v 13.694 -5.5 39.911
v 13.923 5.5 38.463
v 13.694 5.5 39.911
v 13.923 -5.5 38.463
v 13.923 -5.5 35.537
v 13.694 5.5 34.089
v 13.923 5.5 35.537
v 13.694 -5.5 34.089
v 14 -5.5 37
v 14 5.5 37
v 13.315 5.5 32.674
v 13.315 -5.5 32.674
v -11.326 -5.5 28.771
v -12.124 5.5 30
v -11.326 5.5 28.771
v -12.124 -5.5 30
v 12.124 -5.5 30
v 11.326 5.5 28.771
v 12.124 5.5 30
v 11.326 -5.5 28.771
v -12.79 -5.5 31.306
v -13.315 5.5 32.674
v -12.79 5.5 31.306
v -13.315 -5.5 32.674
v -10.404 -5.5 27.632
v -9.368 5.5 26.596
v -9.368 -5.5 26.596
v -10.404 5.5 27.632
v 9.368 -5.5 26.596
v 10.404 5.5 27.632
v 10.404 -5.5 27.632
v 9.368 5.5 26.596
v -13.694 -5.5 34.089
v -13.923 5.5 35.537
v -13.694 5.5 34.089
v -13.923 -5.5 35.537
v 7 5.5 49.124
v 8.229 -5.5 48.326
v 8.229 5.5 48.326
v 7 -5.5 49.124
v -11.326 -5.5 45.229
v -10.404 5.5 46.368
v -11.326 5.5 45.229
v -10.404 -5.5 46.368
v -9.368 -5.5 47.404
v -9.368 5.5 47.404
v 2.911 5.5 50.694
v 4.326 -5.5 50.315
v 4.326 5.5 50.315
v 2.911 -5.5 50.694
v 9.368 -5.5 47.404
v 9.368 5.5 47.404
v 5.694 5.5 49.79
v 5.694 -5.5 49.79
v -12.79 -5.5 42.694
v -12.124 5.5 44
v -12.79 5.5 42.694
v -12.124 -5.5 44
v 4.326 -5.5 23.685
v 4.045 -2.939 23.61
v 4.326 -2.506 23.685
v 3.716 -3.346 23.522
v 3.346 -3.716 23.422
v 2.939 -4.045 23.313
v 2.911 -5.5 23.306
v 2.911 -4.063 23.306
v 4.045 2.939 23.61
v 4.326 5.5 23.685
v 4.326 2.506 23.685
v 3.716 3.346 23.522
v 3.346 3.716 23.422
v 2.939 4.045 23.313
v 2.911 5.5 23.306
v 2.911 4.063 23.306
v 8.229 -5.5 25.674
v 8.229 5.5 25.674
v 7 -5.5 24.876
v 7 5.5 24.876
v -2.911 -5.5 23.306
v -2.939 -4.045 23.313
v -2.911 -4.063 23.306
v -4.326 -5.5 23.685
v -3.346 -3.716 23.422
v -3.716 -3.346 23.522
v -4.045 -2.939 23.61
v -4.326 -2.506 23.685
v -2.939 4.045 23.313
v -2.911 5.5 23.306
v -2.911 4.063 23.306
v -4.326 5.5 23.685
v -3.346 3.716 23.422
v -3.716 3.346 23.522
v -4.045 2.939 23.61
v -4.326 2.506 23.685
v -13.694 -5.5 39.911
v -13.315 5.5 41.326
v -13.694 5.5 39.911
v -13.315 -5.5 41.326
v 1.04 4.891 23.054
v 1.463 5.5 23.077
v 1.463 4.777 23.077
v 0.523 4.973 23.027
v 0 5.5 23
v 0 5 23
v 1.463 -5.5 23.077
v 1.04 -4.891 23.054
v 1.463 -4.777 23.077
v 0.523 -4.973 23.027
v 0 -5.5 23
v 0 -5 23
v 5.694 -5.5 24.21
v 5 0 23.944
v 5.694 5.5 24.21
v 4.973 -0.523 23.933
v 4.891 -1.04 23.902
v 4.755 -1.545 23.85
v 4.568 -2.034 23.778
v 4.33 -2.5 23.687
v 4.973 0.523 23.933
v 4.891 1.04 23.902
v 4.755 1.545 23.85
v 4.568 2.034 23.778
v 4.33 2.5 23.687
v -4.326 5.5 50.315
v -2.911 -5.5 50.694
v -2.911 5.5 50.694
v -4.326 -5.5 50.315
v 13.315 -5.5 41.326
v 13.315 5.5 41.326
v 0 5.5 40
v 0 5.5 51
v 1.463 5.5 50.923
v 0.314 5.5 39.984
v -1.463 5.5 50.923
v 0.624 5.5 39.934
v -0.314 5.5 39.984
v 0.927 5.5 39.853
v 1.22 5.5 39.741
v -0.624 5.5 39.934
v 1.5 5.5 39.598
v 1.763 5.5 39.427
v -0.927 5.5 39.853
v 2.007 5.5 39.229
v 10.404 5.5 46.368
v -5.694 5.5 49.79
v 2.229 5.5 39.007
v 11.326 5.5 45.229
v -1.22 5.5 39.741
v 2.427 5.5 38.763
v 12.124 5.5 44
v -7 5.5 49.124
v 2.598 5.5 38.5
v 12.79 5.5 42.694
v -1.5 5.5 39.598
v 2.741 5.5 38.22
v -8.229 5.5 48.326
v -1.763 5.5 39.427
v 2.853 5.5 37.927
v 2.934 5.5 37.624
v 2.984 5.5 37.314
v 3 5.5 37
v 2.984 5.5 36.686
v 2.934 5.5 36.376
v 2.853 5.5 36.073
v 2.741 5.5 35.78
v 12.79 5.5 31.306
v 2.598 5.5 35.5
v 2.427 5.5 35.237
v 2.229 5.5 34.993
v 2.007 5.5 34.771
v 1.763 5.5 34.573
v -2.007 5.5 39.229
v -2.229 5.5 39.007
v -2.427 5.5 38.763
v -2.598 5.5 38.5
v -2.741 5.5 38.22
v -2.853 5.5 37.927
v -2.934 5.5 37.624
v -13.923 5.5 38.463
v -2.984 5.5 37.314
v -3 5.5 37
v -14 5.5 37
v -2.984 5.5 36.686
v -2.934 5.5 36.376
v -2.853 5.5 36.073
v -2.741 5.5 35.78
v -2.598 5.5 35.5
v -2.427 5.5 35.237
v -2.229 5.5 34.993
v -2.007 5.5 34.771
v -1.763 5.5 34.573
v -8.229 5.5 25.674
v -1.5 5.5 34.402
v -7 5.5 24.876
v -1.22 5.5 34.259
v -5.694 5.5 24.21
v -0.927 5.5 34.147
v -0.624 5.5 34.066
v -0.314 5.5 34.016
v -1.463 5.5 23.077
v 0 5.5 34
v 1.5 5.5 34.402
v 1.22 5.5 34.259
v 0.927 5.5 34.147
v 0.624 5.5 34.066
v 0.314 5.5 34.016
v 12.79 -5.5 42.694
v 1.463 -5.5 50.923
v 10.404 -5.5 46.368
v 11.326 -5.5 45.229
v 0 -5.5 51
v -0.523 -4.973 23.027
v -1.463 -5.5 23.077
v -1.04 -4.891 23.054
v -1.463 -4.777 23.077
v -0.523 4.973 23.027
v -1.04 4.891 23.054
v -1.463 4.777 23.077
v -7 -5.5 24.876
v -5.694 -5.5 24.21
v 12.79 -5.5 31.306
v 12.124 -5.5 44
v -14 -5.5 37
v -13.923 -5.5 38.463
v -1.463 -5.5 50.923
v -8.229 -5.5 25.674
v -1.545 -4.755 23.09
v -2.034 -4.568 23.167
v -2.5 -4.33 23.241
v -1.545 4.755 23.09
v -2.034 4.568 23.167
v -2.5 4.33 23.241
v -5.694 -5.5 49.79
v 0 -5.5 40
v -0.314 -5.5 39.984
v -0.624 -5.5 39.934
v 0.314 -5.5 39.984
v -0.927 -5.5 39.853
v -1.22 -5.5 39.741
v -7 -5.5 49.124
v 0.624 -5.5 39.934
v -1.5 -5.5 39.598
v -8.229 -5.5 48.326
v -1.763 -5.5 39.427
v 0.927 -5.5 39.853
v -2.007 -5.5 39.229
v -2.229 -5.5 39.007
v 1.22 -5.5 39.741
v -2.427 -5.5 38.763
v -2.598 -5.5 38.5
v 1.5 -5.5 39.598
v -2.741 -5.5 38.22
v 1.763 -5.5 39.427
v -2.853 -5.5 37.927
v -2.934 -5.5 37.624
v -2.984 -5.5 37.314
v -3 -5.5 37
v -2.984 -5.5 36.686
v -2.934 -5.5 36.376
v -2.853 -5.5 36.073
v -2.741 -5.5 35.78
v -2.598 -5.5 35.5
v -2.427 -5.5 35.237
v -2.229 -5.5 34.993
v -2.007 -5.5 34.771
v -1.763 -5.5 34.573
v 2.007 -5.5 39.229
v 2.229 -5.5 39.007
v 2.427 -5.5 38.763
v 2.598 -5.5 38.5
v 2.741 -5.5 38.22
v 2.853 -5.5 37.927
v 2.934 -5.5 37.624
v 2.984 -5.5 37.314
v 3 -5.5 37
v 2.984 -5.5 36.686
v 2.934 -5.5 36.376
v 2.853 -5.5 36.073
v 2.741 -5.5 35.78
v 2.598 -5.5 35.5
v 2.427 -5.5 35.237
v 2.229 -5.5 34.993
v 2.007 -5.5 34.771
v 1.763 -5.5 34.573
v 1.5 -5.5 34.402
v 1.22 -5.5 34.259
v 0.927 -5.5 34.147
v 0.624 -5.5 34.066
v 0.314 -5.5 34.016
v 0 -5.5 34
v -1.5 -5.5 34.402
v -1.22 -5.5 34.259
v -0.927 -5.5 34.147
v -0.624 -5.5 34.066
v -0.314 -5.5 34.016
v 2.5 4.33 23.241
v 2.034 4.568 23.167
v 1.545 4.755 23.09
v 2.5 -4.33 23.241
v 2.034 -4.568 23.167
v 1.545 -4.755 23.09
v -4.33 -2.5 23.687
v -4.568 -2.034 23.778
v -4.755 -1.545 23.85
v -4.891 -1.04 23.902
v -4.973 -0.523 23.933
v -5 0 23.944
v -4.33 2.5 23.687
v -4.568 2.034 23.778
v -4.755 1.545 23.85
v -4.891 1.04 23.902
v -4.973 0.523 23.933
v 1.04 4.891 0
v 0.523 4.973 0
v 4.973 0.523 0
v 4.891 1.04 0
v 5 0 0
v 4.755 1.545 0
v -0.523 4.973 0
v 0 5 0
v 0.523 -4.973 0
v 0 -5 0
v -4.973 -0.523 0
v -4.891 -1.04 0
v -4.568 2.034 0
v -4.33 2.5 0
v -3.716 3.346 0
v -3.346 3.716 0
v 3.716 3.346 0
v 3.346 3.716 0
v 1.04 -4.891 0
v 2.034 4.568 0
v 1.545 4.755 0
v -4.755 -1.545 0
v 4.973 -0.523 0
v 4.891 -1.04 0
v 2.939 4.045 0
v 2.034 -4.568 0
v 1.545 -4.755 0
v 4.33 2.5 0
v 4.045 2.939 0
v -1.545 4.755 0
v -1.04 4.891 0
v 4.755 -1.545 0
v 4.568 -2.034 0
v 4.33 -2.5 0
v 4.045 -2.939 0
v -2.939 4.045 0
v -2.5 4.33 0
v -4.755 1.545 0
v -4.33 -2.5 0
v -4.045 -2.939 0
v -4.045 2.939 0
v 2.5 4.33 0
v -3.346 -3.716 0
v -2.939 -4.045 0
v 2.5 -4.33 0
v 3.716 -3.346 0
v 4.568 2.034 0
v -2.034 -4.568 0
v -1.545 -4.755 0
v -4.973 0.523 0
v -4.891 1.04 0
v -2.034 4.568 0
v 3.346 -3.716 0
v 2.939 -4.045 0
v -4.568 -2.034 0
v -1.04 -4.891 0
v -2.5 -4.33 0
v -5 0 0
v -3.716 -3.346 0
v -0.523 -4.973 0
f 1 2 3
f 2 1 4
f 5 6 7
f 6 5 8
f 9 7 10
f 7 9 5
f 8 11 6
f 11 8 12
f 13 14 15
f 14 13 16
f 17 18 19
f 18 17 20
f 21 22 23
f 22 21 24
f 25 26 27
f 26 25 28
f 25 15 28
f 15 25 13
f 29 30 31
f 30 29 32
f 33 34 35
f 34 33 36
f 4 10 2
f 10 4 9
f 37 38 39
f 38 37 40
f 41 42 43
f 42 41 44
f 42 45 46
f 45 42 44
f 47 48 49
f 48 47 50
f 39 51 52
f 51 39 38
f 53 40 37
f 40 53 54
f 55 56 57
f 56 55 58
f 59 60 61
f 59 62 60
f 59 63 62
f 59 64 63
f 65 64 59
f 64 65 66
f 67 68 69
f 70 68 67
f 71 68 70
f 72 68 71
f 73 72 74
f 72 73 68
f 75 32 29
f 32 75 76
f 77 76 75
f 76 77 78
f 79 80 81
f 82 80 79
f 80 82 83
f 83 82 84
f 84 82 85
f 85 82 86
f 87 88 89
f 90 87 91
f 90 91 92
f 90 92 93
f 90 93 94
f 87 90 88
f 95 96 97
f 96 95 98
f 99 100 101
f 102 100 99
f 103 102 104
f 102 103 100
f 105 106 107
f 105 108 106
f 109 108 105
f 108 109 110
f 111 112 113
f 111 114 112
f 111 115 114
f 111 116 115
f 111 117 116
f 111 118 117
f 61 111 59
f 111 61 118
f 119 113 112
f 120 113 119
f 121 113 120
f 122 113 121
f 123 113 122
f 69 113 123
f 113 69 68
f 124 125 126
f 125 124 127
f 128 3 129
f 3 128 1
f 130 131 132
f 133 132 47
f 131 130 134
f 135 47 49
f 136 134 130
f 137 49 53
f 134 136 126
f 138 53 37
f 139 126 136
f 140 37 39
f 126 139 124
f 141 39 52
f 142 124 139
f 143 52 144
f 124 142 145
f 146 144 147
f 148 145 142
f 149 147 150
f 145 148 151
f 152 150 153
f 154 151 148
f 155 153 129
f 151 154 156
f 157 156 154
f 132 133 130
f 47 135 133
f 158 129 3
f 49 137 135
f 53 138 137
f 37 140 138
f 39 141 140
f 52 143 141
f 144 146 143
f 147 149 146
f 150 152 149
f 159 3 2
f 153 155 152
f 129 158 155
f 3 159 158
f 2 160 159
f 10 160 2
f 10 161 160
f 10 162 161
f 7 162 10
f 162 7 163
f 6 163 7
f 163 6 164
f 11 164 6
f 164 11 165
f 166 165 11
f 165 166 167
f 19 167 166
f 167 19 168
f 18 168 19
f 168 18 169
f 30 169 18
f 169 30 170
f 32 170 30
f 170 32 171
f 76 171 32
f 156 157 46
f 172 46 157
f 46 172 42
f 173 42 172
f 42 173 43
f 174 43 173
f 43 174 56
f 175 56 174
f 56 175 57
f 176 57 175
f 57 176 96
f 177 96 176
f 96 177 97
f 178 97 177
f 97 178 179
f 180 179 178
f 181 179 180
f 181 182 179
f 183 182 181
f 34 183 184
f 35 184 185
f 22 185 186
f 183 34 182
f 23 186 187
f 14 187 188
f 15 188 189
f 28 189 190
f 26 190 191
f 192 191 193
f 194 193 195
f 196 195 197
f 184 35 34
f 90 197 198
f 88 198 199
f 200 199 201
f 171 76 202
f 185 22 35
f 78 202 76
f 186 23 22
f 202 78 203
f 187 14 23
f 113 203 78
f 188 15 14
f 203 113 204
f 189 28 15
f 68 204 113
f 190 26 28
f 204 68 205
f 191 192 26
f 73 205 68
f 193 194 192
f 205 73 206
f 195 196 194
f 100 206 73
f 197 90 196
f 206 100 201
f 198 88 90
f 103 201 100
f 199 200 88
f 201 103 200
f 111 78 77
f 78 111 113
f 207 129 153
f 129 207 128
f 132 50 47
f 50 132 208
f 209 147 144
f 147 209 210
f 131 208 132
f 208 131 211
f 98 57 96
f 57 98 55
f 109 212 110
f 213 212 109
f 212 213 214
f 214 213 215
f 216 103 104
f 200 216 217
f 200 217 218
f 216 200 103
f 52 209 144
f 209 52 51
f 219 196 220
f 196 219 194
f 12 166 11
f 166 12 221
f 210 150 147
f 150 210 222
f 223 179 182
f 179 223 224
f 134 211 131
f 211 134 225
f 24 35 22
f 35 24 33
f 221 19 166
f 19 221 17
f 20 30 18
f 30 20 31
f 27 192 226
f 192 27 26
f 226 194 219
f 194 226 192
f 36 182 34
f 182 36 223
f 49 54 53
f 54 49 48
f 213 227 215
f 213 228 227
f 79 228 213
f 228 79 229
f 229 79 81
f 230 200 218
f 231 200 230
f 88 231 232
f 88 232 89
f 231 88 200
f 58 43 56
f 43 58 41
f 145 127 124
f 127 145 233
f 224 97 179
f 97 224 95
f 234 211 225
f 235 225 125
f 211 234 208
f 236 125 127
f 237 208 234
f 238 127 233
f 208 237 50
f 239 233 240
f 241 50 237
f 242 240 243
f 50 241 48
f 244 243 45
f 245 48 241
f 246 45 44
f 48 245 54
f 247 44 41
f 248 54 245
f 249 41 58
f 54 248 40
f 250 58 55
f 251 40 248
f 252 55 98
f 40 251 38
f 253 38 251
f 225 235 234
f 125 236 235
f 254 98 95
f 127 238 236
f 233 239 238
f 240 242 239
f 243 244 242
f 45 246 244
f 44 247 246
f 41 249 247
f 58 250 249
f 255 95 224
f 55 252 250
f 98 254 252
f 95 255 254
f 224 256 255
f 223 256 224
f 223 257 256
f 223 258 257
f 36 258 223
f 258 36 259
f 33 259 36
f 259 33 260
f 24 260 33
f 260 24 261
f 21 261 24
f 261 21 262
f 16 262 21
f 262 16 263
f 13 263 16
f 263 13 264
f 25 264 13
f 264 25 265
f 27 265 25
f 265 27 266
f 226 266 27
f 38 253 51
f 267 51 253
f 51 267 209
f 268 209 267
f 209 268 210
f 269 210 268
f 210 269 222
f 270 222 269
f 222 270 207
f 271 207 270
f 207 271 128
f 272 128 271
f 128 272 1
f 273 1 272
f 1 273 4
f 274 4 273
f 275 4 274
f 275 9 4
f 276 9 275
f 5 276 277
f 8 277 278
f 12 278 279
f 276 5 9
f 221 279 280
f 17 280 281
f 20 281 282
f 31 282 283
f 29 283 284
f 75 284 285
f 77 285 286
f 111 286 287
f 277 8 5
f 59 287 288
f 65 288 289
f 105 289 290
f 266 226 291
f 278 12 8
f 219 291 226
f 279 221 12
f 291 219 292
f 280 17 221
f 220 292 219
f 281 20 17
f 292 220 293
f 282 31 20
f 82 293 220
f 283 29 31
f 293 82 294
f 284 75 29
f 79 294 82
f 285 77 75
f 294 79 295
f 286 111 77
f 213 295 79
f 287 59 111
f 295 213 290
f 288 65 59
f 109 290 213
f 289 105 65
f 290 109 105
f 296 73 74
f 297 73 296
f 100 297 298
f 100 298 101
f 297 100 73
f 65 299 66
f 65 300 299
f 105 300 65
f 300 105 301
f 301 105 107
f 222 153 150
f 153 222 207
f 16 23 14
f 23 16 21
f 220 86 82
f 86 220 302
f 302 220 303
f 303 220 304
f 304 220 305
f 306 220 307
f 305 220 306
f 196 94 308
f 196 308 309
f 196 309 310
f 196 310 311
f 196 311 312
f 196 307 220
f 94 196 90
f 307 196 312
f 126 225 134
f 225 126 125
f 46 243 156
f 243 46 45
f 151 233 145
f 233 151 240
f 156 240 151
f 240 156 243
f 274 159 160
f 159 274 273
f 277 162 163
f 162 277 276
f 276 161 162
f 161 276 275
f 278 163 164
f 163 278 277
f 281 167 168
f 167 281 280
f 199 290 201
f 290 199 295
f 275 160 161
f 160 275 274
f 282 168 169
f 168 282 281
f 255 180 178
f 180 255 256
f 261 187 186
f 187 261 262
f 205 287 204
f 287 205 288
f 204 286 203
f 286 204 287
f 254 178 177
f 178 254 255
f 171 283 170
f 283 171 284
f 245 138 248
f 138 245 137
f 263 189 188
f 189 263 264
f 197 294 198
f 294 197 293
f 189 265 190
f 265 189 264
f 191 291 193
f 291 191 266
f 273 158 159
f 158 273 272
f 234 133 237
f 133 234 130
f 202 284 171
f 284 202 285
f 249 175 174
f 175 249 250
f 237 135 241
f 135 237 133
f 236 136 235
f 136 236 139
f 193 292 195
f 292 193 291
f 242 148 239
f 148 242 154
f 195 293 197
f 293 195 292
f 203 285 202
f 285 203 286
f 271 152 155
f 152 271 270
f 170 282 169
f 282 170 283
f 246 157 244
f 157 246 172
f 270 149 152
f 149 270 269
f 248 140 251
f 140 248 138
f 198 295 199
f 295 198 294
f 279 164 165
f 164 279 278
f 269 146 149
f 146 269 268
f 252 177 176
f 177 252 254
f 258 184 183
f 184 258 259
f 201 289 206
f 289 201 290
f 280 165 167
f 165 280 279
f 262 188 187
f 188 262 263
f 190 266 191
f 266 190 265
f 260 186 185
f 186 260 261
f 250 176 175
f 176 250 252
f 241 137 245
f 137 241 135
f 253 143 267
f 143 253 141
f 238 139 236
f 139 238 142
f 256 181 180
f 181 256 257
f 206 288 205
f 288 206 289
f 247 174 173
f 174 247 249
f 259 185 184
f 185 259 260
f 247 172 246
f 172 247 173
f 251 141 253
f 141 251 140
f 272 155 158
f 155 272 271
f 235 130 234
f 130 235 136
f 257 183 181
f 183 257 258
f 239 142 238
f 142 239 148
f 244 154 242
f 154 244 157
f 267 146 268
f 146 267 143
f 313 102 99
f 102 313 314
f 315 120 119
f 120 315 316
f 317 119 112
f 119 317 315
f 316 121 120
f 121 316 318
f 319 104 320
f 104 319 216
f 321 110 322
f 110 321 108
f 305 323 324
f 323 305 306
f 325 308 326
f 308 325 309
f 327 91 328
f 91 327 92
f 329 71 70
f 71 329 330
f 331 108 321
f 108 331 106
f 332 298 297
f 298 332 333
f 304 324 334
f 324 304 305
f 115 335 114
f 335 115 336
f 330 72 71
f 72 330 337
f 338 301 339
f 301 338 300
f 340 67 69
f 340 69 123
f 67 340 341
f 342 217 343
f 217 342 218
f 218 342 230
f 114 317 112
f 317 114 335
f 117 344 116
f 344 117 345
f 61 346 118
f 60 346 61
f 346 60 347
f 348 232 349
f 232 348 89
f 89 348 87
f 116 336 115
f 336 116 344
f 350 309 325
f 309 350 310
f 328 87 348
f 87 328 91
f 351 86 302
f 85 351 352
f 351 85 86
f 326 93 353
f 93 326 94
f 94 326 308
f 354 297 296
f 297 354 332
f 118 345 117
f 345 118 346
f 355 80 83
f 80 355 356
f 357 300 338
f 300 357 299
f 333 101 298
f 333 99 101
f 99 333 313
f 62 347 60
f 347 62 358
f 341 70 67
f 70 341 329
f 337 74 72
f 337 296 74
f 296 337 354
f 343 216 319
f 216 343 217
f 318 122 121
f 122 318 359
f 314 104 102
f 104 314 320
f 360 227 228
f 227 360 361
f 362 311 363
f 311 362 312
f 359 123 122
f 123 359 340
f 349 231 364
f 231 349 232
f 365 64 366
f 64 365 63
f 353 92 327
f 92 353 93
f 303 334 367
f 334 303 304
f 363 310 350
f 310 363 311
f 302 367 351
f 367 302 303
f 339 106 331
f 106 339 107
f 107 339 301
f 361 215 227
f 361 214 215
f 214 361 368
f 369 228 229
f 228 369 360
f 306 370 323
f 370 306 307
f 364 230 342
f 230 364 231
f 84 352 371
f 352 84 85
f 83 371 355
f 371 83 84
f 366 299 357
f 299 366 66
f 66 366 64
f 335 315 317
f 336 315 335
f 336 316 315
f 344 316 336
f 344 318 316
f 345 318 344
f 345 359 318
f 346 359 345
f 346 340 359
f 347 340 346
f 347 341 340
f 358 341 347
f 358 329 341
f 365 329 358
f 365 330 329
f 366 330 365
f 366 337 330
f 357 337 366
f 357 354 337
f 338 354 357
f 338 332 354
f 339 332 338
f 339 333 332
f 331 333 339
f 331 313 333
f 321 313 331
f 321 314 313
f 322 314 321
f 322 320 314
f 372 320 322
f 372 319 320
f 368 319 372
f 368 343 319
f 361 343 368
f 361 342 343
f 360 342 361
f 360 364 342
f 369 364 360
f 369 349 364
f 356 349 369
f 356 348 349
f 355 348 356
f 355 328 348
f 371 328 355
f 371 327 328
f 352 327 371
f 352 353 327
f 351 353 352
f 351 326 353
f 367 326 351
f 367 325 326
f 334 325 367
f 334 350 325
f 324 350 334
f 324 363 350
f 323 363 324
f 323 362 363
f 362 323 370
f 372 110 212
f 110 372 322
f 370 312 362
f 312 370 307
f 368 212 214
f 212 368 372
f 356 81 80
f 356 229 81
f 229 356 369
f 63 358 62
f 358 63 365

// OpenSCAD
// Flat-eye bolt with a smooth shaft.
$fn = 60;
eps = 0.02;
shaft_d = 10;
shaft_l = 24;
eye_outer_d = 28;
eye_inner_d = eye_outer_d - 2 * 11;
eye_t = 11;
module eye() {
    translate([0, -eye_t / 2, shaft_l + eye_outer_d / 2 - 1]) rotate([-90, 0, 0])
        difference() { cylinder(d = eye_outer_d, h = eye_t); translate([0, 0, -eps]) cylinder(d = eye_inner_d, h = eye_t + 2 * eps); }
}
union() { cylinder(d = shaft_d, h = shaft_l + 2); eye(); }
